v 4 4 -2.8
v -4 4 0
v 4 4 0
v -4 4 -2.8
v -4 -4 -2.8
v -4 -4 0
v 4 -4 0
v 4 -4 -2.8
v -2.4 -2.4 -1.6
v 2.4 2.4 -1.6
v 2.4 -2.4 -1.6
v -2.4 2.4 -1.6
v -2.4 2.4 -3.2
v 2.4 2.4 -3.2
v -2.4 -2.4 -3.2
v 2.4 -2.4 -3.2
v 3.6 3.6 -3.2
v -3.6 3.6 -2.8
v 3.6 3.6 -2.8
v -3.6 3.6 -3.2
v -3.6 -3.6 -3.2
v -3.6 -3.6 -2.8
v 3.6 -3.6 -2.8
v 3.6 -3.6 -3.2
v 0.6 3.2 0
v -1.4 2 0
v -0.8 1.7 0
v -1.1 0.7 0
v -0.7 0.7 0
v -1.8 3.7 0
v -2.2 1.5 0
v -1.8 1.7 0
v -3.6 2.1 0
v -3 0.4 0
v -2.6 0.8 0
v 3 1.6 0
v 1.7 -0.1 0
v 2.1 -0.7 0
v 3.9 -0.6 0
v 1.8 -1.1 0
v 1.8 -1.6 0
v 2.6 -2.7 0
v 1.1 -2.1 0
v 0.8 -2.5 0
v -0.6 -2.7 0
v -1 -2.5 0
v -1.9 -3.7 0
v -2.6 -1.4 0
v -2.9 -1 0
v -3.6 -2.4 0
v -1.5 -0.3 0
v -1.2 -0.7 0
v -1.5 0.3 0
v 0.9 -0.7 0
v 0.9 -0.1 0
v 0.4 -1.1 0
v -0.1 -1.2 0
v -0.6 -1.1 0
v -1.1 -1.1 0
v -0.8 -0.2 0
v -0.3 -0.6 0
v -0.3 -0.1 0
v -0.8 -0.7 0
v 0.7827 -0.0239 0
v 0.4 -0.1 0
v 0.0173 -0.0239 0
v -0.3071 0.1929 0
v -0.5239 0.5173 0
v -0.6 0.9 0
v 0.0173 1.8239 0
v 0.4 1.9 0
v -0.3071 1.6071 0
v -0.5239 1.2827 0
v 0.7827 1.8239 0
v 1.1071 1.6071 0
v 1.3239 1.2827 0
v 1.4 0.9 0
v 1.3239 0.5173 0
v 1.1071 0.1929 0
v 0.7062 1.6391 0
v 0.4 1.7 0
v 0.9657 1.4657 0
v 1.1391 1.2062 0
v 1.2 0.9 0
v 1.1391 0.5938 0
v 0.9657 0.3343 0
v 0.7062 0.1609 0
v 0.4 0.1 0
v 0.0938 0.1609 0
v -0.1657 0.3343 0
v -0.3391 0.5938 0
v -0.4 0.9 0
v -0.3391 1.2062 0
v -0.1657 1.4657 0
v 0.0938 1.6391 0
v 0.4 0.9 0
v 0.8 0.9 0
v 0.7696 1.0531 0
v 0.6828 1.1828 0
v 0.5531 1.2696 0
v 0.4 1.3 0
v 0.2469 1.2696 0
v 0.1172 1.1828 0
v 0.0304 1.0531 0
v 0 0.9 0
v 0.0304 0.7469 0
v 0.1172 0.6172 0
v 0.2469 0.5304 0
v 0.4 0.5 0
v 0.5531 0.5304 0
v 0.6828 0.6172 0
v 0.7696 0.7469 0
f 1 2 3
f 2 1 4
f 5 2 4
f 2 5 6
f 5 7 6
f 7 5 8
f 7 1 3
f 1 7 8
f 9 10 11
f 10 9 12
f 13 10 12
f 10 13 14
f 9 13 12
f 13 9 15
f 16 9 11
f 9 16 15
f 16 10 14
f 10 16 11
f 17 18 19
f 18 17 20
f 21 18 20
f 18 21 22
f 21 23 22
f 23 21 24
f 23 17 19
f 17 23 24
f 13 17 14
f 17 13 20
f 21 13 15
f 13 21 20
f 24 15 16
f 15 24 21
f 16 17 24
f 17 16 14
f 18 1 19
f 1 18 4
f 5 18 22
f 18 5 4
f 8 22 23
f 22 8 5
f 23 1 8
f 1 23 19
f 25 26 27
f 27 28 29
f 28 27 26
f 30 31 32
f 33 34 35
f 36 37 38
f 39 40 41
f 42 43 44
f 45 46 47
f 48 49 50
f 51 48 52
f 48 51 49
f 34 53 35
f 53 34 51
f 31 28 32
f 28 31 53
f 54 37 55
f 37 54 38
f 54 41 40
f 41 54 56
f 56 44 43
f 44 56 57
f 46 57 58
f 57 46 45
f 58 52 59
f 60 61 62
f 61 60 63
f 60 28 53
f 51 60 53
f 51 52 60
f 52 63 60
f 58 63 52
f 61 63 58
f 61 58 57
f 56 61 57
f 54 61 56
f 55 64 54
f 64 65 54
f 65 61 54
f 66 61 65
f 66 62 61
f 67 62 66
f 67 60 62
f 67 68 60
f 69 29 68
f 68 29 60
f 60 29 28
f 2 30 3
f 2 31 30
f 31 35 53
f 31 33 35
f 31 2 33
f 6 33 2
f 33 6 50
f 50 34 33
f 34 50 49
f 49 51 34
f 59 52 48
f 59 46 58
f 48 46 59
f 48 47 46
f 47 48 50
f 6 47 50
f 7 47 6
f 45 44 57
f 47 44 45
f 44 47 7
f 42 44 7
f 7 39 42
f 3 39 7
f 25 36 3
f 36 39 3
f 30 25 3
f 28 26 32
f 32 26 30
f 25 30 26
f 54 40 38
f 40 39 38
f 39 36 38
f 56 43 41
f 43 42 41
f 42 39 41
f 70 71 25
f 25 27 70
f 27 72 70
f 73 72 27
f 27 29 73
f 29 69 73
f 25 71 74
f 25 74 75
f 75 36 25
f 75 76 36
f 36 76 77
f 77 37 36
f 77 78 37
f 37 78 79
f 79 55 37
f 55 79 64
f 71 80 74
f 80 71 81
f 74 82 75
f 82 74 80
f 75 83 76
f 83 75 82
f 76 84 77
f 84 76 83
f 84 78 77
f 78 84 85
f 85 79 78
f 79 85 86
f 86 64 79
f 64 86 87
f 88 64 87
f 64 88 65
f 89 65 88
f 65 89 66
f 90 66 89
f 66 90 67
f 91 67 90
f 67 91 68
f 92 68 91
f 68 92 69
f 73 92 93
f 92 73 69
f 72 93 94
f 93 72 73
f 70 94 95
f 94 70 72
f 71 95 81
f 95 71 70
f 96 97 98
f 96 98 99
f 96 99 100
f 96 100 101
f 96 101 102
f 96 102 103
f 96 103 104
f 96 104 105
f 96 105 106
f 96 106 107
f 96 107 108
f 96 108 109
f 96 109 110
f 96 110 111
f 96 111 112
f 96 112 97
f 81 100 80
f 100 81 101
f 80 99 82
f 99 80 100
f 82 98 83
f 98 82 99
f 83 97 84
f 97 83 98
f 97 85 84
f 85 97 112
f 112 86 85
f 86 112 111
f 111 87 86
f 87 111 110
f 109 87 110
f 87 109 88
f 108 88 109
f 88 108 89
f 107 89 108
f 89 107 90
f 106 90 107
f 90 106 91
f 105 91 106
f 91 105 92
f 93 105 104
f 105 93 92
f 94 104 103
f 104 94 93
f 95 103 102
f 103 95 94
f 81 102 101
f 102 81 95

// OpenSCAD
// file: ../p/box5.scad
use <../lib.scad>
function ldraw_lib__box5() = [
// 0 Box with 5 Faces and All Edges
// 0 Name: box5.dat
// 0 Author: James Jessiman
// 0 !LDRAW_ORG Primitive UPDATE 2012-01
// 0 !LICENSE Licensed under CC BY 2.0 and CC BY 4.0 : see CAreadme.txt
// 
// 0 BFC CERTIFY CCW
  [0,"BFC","CERTIFY"],
  [0,"BFC","CCW"],
// 
// 0 !HISTORY 2002-04-03 [sbliss] Modified for BFC compliance
// 0 !HISTORY 2002-04-25 [PTadmin] Official Update 2002-02
// 0 !HISTORY 2007-06-24 [PTadmin] Header formatted for Contributor Agreement
// 0 !HISTORY 2008-07-01 [PTadmin] Official Update 2008-01
// 0 !HISTORY 2012-02-16 [Philo] Changed to CCW
// 0 !HISTORY 2012-03-30 [PTadmin] Official Update 2012-01
// 
// 
// 2 24 1 1 1 -1 1 1
  [2,24,1,1,1,-1,1,1],
// 2 24 -1 1 1 -1 1 -1
  [2,24,-1,1,1,-1,1,-1],
// 2 24 -1 1 -1 1 1 -1
  [2,24,-1,1,-1,1,1,-1],
// 2 24 1 1 -1 1 1 1
  [2,24,1,1,-1,1,1,1],
// 2 24 1 0 1 -1 0 1
  [2,24,1,0,1,-1,0,1],
// 2 24 -1 0 1 -1 0 -1
  [2,24,-1,0,1,-1,0,-1],
// 2 24 -1 0 -1 1 0 -1
  [2,24,-1,0,-1,1,0,-1],
// 2 24 1 0 -1 1 0 1
  [2,24,1,0,-1,1,0,1],
// 2 24 1 0 1 1 1 1
  [2,24,1,0,1,1,1,1],
// 2 24 -1 0 1 -1 1 1
  [2,24,-1,0,1,-1,1,1],
// 2 24 1 0 -1 1 1 -1
  [2,24,1,0,-1,1,1,-1],
// 2 24 -1 0 -1 -1 1 -1
  [2,24,-1,0,-1,-1,1,-1],
// 4 16 -1 1 1 1 1 1 1 1 -1 -1 1 -1
  [4,16,-1,1,1,1,1,1,1,1,-1,-1,1,-1],
// 4 16 -1 1 1 -1 0 1 1 0 1 1 1 1
  [4,16,-1,1,1,-1,0,1,1,0,1,1,1,1],
// 4 16 -1 1 -1 -1 0 -1 -1 0 1 -1 1 1
  [4,16,-1,1,-1,-1,0,-1,-1,0,1,-1,1,1],
// 4 16 1 1 -1 1 0 -1 -1 0 -1 -1 1 -1
  [4,16,1,1,-1,1,0,-1,-1,0,-1,-1,1,-1],
// 4 16 1 1 1 1 0 1 1 0 -1 1 1 -1
  [4,16,1,1,1,1,0,1,1,0,-1,1,1,-1],
];
makepoly(ldraw_lib__box5(), line=0.2);
// file: ../p/box4.scad
use <../lib.scad>
function ldraw_lib__box4() = [
// 0 Box with 4 Faces (2 Parallel Pairs) and All Edges
// 0 Name: box4.dat
// 0 Author: James Jessiman
// 0 !LDRAW_ORG Primitive UPDATE 2012-01
// 0 !LICENSE Licensed under CC BY 2.0 and CC BY 4.0 : see CAreadme.txt
// 
// 0 BFC CERTIFY CCW
  [0,"BFC","CERTIFY"],
  [0,"BFC","CCW"],
// 
// 0 !HISTORY 2002-04-03 [sbliss] Modified for BFC compliance
// 0 !HISTORY 2002-04-25 [PTadmin] Official Update 2002-02
// 0 !HISTORY 2007-06-24 [PTadmin] Header formatted for Contributor Agreement
// 0 !HISTORY 2008-07-01 [PTadmin] Official Update 2008-01
// 0 !HISTORY 2012-02-16 [Philo] Changed to CCW
// 0 !HISTORY 2012-03-30 [PTadmin] Official Update 2012-01
// 
// 
// 2 24 1 1 1 -1 1 1
  [2,24,1,1,1,-1,1,1],
// 2 24 -1 1 1 -1 1 -1
  [2,24,-1,1,1,-1,1,-1],
// 2 24 -1 1 -1 1 1 -1
  [2,24,-1,1,-1,1,1,-1],
// 2 24 1 1 -1 1 1 1
  [2,24,1,1,-1,1,1,1],
// 2 24 1 0 1 -1 0 1
  [2,24,1,0,1,-1,0,1],
// 2 24 -1 0 1 -1 0 -1
  [2,24,-1,0,1,-1,0,-1],
// 2 24 -1 0 -1 1 0 -1
  [2,24,-1,0,-1,1,0,-1],
// 2 24 1 0 -1 1 0 1
  [2,24,1,0,-1,1,0,1],
// 2 24 1 0 1 1 1 1
  [2,24,1,0,1,1,1,1],
// 2 24 -1 0 1 -1 1 1
  [2,24,-1,0,1,-1,1,1],
// 2 24 1 0 -1 1 1 -1
  [2,24,1,0,-1,1,1,-1],
// 2 24 -1 0 -1 -1 1 -1
  [2,24,-1,0,-1,-1,1,-1],
// 4 16 -1 1 1 -1 0 1 1 0 1 1 1 1
  [4,16,-1,1,1,-1,0,1,1,0,1,1,1,1],
// 4 16 -1 1 -1 -1 0 -1 -1 0 1 -1 1 1
  [4,16,-1,1,-1,-1,0,-1,-1,0,1,-1,1,1],
// 4 16 1 1 -1 1 0 -1 -1 0 -1 -1 1 -1
  [4,16,1,1,-1,1,0,-1,-1,0,-1,-1,1,-1],
// 4 16 1 1 1 1 0 1 1 0 -1 1 1 -1
  [4,16,1,1,1,1,0,1,1,0,-1,1,1,-1],
];
makepoly(ldraw_lib__box4(), line=0.2);
// file: s/3070bs01.scad
use <../../lib.scad>
use <../../p/box4.scad>
use <../../p/box5.scad>
function ldraw_lib__s__3070bs01() = [
// 0 ~Tile  1 x  1 with Groove without Top Face
// 0 Name: s\3070bs01.dat
// 0 Author: Chris Dee [cwdee]
// 0 !LDRAW_ORG Subpart UPDATE 2009-02
// 0 !LICENSE Licensed under CC BY 2.0 and CC BY 4.0 : see CAreadme.txt
// 
// 0 BFC CERTIFY CCW
  [0,"BFC","CERTIFY"],
  [0,"BFC","CCW"],
// 
// 0 !HISTORY 2009-09-03 [PTadmin] Official Update 2009-02
// 
// 
// 1 16 0 0 0 10 0 0 0 7 0 0 0 10 box4.dat
  [1,16,0,0,0,10,0,0,0,7,0,0,0,10, ldraw_lib__box4()],
// 0 BFC INVERTNEXT
  [0,"BFC","INVERTNEXT"],
// 1 16 0 8 0 6 0 0 0 -4 0 0 0 6 box5.dat
  [1,16,0,8,0,6,0,0,0,-4,0,0,0,6, ldraw_lib__box5()],
// 1 16 0 7 0 9 0 0 0 1 0 0 0 9 box4.dat
  [1,16,0,7,0,9,0,0,0,1,0,0,0,9, ldraw_lib__box4()],
// 
// 4 16 9 8 9 6 8 6 -6 8 6 -9 8 9
  [4,16,9,8,9,6,8,6,-6,8,6,-9,8,9],
// 4 16 -9 8 9 -6 8 6 -6 8 -6 -9 8 -9
  [4,16,-9,8,9,-6,8,6,-6,8,-6,-9,8,-9],
// 4 16 -9 8 -9 -6 8 -6 6 8 -6 9 8 -9
  [4,16,-9,8,-9,-6,8,-6,6,8,-6,9,8,-9],
// 4 16 9 8 -9 6 8 -6 6 8 6 9 8 9
  [4,16,9,8,-9,6,8,-6,6,8,6,9,8,9],
// 
// 4 16 10 7 10 9 7 9 -9 7 9 -10 7 10
  [4,16,10,7,10,9,7,9,-9,7,9,-10,7,10],
// 4 16 -10 7 10 -9 7 9 -9 7 -9 -10 7 -10
  [4,16,-10,7,10,-9,7,9,-9,7,-9,-10,7,-10],
// 4 16 -10 7 -10 -9 7 -9 9 7 -9 10 7 -10
  [4,16,-10,7,-10,-9,7,-9,9,7,-9,10,7,-10],
// 4 16 10 7 -10 9 7 -9 9 7 9 10 7 10
  [4,16,10,7,-10,9,7,-9,9,7,9,10,7,10],
// 0
];
makepoly(ldraw_lib__s__3070bs01(), line=0.2);
// file: ../p/4-4disc.scad
use <../lib.scad>
function ldraw_lib__4_4disc() = [
// 0 Disc 1.0
// 0 Name: 4-4disc.dat
// 0 Author: James Jessiman
// 0 !LDRAW_ORG Primitive UPDATE 2002-02
// 0 !LICENSE Licensed under CC BY 2.0 and CC BY 4.0 : see CAreadme.txt
// 
// 0 BFC CERTIFY CCW
  [0,"BFC","CERTIFY"],
  [0,"BFC","CCW"],
// 
// 0 !HISTORY 1998-12-15 [PTadmin] Official Update 1998-10
// 0 !HISTORY 2002-03-23 [sbliss] Added BFC statement
// 0 !HISTORY 2002-04-25 [PTadmin] Official Update 2002-02
// 0 !HISTORY 2007-06-24 [PTadmin] Header formatted for Contributor Agreement
// 0 !HISTORY 2008-07-01 [PTadmin] Official Update 2008-01
// 
// 
// 3 16 0 0 0 1 0 0 0.9239 0 0.3827
  [3,16,0,0,0,1,0,0,0.9239,0,0.3827],
// 3 16 0 0 0 0.9239 0 0.3827 0.7071 0 0.7071
  [3,16,0,0,0,0.9239,0,0.3827,0.7071,0,0.7071],
// 3 16 0 0 0 0.7071 0 0.7071 0.3827 0 0.9239
  [3,16,0,0,0,0.7071,0,0.7071,0.3827,0,0.9239],
// 3 16 0 0 0 0.3827 0 0.9239 0 0 1
  [3,16,0,0,0,0.3827,0,0.9239,0,0,1],
// 3 16 0 0 0 0 0 1 -0.3827 0 0.9239
  [3,16,0,0,0,0,0,1,-0.3827,0,0.9239],
// 3 16 0 0 0 -0.3827 0 0.9239 -0.7071 0 0.7071
  [3,16,0,0,0,-0.3827,0,0.9239,-0.7071,0,0.7071],
// 3 16 0 0 0 -0.7071 0 0.7071 -0.9239 0 0.3827
  [3,16,0,0,0,-0.7071,0,0.7071,-0.9239,0,0.3827],
// 3 16 0 0 0 -0.9239 0 0.3827 -1 0 -0
  [3,16,0,0,0,-0.9239,0,0.3827,-1,0,-0],
// 3 16 0 0 0 -1 0 -0 -0.9239 0 -0.3827
  [3,16,0,0,0,-1,0,-0,-0.9239,0,-0.3827],
// 3 16 0 0 0 -0.9239 0 -0.3827 -0.7071 0 -0.7071
  [3,16,0,0,0,-0.9239,0,-0.3827,-0.7071,0,-0.7071],
// 3 16 0 0 0 -0.7071 0 -0.7071 -0.3827 0 -0.9239
  [3,16,0,0,0,-0.7071,0,-0.7071,-0.3827,0,-0.9239],
// 3 16 0 0 0 -0.3827 0 -0.9239 0 0 -1
  [3,16,0,0,0,-0.3827,0,-0.9239,0,0,-1],
// 3 16 0 0 0 0 0 -1 0.3827 0 -0.9239
  [3,16,0,0,0,0,0,-1,0.3827,0,-0.9239],
// 3 16 0 0 0 0.3827 0 -0.9239 0.7071 0 -0.7071
  [3,16,0,0,0,0.3827,0,-0.9239,0.7071,0,-0.7071],
// 3 16 0 0 0 0.7071 0 -0.7071 0.9239 0 -0.3827
  [3,16,0,0,0,0.7071,0,-0.7071,0.9239,0,-0.3827],
// 3 16 0 0 0 0.9239 0 -0.3827 1 0 0
  [3,16,0,0,0,0.9239,0,-0.3827,1,0,0],
// 0
];
makepoly(ldraw_lib__4_4disc(), line=0.2);
// main file
use <../lib.scad>
use <../p/4-4disc.scad>
use <s/3070bs01.scad>
function ldraw_lib__3070bph0() = [
// 0 Tile  1 x  1 with Spider Pattern
// 0 Name: 3070bph0.dat
// 0 Author: Michael Heidemann [mikeheide]
// 0 !LDRAW_ORG Part UPDATE 2009-03
// 0 !LICENSE Licensed under CC BY 2.0 and CC BY 4.0 : see CAreadme.txt
// 
// 0 BFC CERTIFY CCW
  [0,"BFC","CERTIFY"],
  [0,"BFC","CCW"],
// 
// 0 !HISTORY 2009-12-29 [PTadmin] Official Update 2009-03
// 
// 
// 1 16 0 0 0 1 0 0 0 1 0 0 0 1 s\3070bs01.dat
  [1,16,0,0,0,1,0,0,0,1,0,0,0,1, ldraw_lib__s__3070bs01()],
// 3 0 1.5 0 8 -3.5 0 5 -2 0 4.25
  [3,0,1.5,0,8,-3.5,0,5,-2,0,4.25],
// 4 0 -3.5 0 5 -2.75 0 1.75 -1.75 0 1.75 -2 0 4.25
  [4,0,-3.5,0,5,-2.75,0,1.75,-1.75,0,1.75,-2,0,4.25],
// 3 0 -4.5 0 9.25 -5.5 0 3.75 -4.5 0 4.25
  [3,0,-4.5,0,9.25,-5.5,0,3.75,-4.5,0,4.25],
// 3 0 -9 0 5.25 -7.5 0 1 -6.5 0 2
  [3,0,-9,0,5.25,-7.5,0,1,-6.5,0,2],
// 3 0 7.5 0 4 4.25 0 -0.25 5.25 0 -1.75
  [3,0,7.5,0,4,4.25,0,-0.25,5.25,0,-1.75],
// 3 0 9.75 0 -1.5 4.5 0 -2.75 4.5 0 -4
  [3,0,9.75,0,-1.5,4.5,0,-2.75,4.5,0,-4],
// 3 0 6.5 0 -6.75 2.75 0 -5.25 2 0 -6.25
  [3,0,6.5,0,-6.75,2.75,0,-5.25,2,0,-6.25],
// 3 0 -1.5 0 -6.75 -2.5 0 -6.25 -4.75 0 -9.25
  [3,0,-1.5,0,-6.75,-2.5,0,-6.25,-4.75,0,-9.25],
// 3 0 -6.5 0 -3.5 -7.25 0 -2.5 -9 0 -6
  [3,0,-6.5,0,-3.5,-7.25,0,-2.5,-9,0,-6],
// 4 0 -6.5 0 -3.5 -3 0 -1.75 -3.75 0 -0.75 -7.25 0 -2.5
  [4,0,-6.5,0,-3.5,-3,0,-1.75,-3.75,0,-0.75,-7.25,0,-2.5],
// 4 0 -6.5 0 2 -7.5 0 1 -3.75 0 -0.75 -3.75 0 0.75
  [4,0,-6.5,0,2,-7.5,0,1,-3.75,0,-0.75,-3.75,0,0.75],
// 4 0 -4.5 0 4.25 -5.5 0 3.75 -3.75 0 0.75 -2.75 0 1.75
  [4,0,-4.5,0,4.25,-5.5,0,3.75,-3.75,0,0.75,-2.75,0,1.75],
// 4 0 4.25 0 -0.25 2.25 0 -0.25 2.25 0 -1.75 5.25 0 -1.75
  [4,0,4.25,0,-0.25,2.25,0,-0.25,2.25,0,-1.75,5.25,0,-1.75],
// 4 0 4.5 0 -2.75 2.25 0 -1.75 1 0 -2.75 4.5 0 -4
  [4,0,4.5,0,-2.75,2.25,0,-1.75,1,0,-2.75,4.5,0,-4],
// 4 0 2 0 -6.25 2.75 0 -5.25 1 0 -2.75 -0.25 0 -3
  [4,0,2,0,-6.25,2.75,0,-5.25,1,0,-2.75,-0.25,0,-3],
// 4 0 -2.5 0 -6.25 -1.5 0 -6.75 -0.25 0 -3 -1.5 0 -2.75
  [4,0,-2.5,0,-6.25,-1.5,0,-6.75,-0.25,0,-3,-1.5,0,-2.75],
// 3 0 -1.5 0 -2.75 -3 0 -1.75 -2.75 0 -2.75
  [3,0,-1.5,0,-2.75,-3,0,-1.75,-2.75,0,-2.75],
// 4 15 -2 0 -1.75 -0.75 0 -1.5 -0.75 0 -0.25 -2 0 -0.5
  [4,15,-2,0,-1.75,-0.75,0,-1.5,-0.75,0,-0.25,-2,0,-0.5],
// 3 0 -2 0 -0.5 -2.75 0 1.75 -3.75 0 0.75
  [3,0,-2,0,-0.5,-2.75,0,1.75,-3.75,0,0.75],
// 3 0 -3.75 0 -0.75 -2 0 -0.5 -3.75 0 0.75
  [3,0,-3.75,0,-0.75,-2,0,-0.5,-3.75,0,0.75],
// 3 0 -3.75 0 -0.75 -3 0 -1.75 -2 0 -0.5
  [3,0,-3.75,0,-0.75,-3,0,-1.75,-2,0,-0.5],
// 3 0 -3 0 -1.75 -2 0 -1.75 -2 0 -0.5
  [3,0,-3,0,-1.75,-2,0,-1.75,-2,0,-0.5],
// 3 0 -1.5 0 -2.75 -2 0 -1.75 -3 0 -1.75
  [3,0,-1.5,0,-2.75,-2,0,-1.75,-3,0,-1.75],
// 3 0 -0.75 0 -1.5 -2 0 -1.75 -1.5 0 -2.75
  [3,0,-0.75,0,-1.5,-2,0,-1.75,-1.5,0,-2.75],
// 3 0 -0.75 0 -1.5 -1.5 0 -2.75 -0.25 0 -3
  [3,0,-0.75,0,-1.5,-1.5,0,-2.75,-0.25,0,-3],
// 3 0 1 0 -2.75 -0.75 0 -1.5 -0.25 0 -3
  [3,0,1,0,-2.75,-0.75,0,-1.5,-0.25,0,-3],
// 3 0 2.25 0 -1.75 -0.75 0 -1.5 1 0 -2.75
  [3,0,2.25,0,-1.75,-0.75,0,-1.5,1,0,-2.75],
// 3 0 2.25 0 -0.25 1.9567 0 -0.0597 2.25 0 -1.75
  [3,0,2.25,0,-0.25,1.9567,0,-0.0597,2.25,0,-1.75],
// 3 0 1.9567 0 -0.0597 1 0 -0.25 2.25 0 -1.75
  [3,0,1.9567,0,-0.0597,1,0,-0.25,2.25,0,-1.75],
// 3 0 1 0 -0.25 -0.75 0 -1.5 2.25 0 -1.75
  [3,0,1,0,-0.25,-0.75,0,-1.5,2.25,0,-1.75],
// 3 0 0.0433 0 -0.0597 -0.75 0 -1.5 1 0 -0.25
  [3,0,0.0433,0,-0.0597,-0.75,0,-1.5,1,0,-0.25],
// 3 0 0.0433 0 -0.0597 -0.75 0 -0.25 -0.75 0 -1.5
  [3,0,0.0433,0,-0.0597,-0.75,0,-0.25,-0.75,0,-1.5],
// 3 0 -0.7678 0 0.4822 -0.75 0 -0.25 0.0433 0 -0.0597
  [3,0,-0.7678,0,0.4822,-0.75,0,-0.25,0.0433,0,-0.0597],
// 3 0 -0.7678 0 0.4822 -2 0 -0.5 -0.75 0 -0.25
  [3,0,-0.7678,0,0.4822,-2,0,-0.5,-0.75,0,-0.25],
// 3 0 -0.7678 0 0.4822 -1.3097 0 1.2933 -2 0 -0.5
  [3,0,-0.7678,0,0.4822,-1.3097,0,1.2933,-2,0,-0.5],
// 3 0 -1.5 0 2.25 -1.75 0 1.75 -1.3097 0 1.2933
  [3,0,-1.5,0,2.25,-1.75,0,1.75,-1.3097,0,1.2933],
// 3 0 -1.3097 0 1.2933 -1.75 0 1.75 -2 0 -0.5
  [3,0,-1.3097,0,1.2933,-1.75,0,1.75,-2,0,-0.5],
// 3 0 -2 0 -0.5 -1.75 0 1.75 -2.75 0 1.75
  [3,0,-2,0,-0.5,-1.75,0,1.75,-2.75,0,1.75],
// 3 16 -10 0 10 -4.5 0 9.25 10 0 10
  [3,16,-10,0,10,-4.5,0,9.25,10,0,10],
// 3 16 -10 0 10 -5.5 0 3.75 -4.5 0 9.25
  [3,16,-10,0,10,-5.5,0,3.75,-4.5,0,9.25],
// 3 16 -5.5 0 3.75 -6.5 0 2 -3.75 0 0.75
  [3,16,-5.5,0,3.75,-6.5,0,2,-3.75,0,0.75],
// 3 16 -5.5 0 3.75 -9 0 5.25 -6.5 0 2
  [3,16,-5.5,0,3.75,-9,0,5.25,-6.5,0,2],
// 3 16 -5.5 0 3.75 -10 0 10 -9 0 5.25
  [3,16,-5.5,0,3.75,-10,0,10,-9,0,5.25],
// 4 16 -9 0 -6 -9 0 5.25 -10 0 10 -10 0 -10
  [4,16,-9,0,-6,-9,0,5.25,-10,0,10,-10,0,-10],
// 4 16 -7.25 0 -2.5 -7.5 0 1 -9 0 5.25 -9 0 -6
  [4,16,-7.25,0,-2.5,-7.5,0,1,-9,0,5.25,-9,0,-6],
// 3 16 -7.25 0 -2.5 -3.75 0 -0.75 -7.5 0 1
  [3,16,-7.25,0,-2.5,-3.75,0,-0.75,-7.5,0,1],
// 3 16 -2.75 0 -2.75 -3 0 -1.75 -6.5 0 -3.5
  [3,16,-2.75,0,-2.75,-3,0,-1.75,-6.5,0,-3.5],
// 3 16 -2.75 0 -2.75 -2.5 0 -6.25 -1.5 0 -2.75
  [3,16,-2.75,0,-2.75,-2.5,0,-6.25,-1.5,0,-2.75],
// 3 16 -6.5 0 -3.5 -2.5 0 -6.25 -2.75 0 -2.75
  [3,16,-6.5,0,-3.5,-2.5,0,-6.25,-2.75,0,-2.75],
// 4 16 -6.5 0 -3.5 -9 0 -6 -4.75 0 -9.25 -2.5 0 -6.25
  [4,16,-6.5,0,-3.5,-9,0,-6,-4.75,0,-9.25,-2.5,0,-6.25],
// 3 16 -10 0 -10 -4.75 0 -9.25 -9 0 -6
  [3,16,-10,0,-10,-4.75,0,-9.25,-9,0,-6],
// 3 16 10 0 -10 -4.75 0 -9.25 -10 0 -10
  [3,16,10,0,-10,-4.75,0,-9.25,-10,0,-10],
// 3 16 -1.5 0 -6.75 2 0 -6.25 -0.25 0 -3
  [3,16,-1.5,0,-6.75,2,0,-6.25,-0.25,0,-3],
// 4 16 -4.75 0 -9.25 10 0 -10 2 0 -6.25 -1.5 0 -6.75
  [4,16,-4.75,0,-9.25,10,0,-10,2,0,-6.25,-1.5,0,-6.75],
// 3 16 6.5 0 -6.75 2 0 -6.25 10 0 -10
  [3,16,6.5,0,-6.75,2,0,-6.25,10,0,-10],
// 3 16 10 0 -10 9.75 0 -1.5 6.5 0 -6.75
  [3,16,10,0,-10,9.75,0,-1.5,6.5,0,-6.75],
// 3 16 10 0 10 9.75 0 -1.5 10 0 -10
  [3,16,10,0,10,9.75,0,-1.5,10,0,-10],
// 3 16 1.5 0 8 7.5 0 4 10 0 10
  [3,16,1.5,0,8,7.5,0,4,10,0,10],
// 3 16 7.5 0 4 9.75 0 -1.5 10 0 10
  [3,16,7.5,0,4,9.75,0,-1.5,10,0,10],
// 3 16 -4.5 0 9.25 1.5 0 8 10 0 10
  [3,16,-4.5,0,9.25,1.5,0,8,10,0,10],
// 3 16 -2.75 0 1.75 -3.5 0 5 -4.5 0 4.25
  [3,16,-2.75,0,1.75,-3.5,0,5,-4.5,0,4.25],
// 3 16 -4.5 0 4.25 -3.5 0 5 -4.5 0 9.25
  [3,16,-4.5,0,4.25,-3.5,0,5,-4.5,0,9.25],
// 3 16 1.5 0 8 -4.5 0 9.25 -3.5 0 5
  [3,16,1.5,0,8,-4.5,0,9.25,-3.5,0,5],
// 3 16 2.25 0 -1.75 4.5 0 -2.75 5.25 0 -1.75
  [3,16,2.25,0,-1.75,4.5,0,-2.75,5.25,0,-1.75],
// 3 16 4.5 0 -2.75 9.75 0 -1.5 5.25 0 -1.75
  [3,16,4.5,0,-2.75,9.75,0,-1.5,5.25,0,-1.75],
// 3 16 9.75 0 -1.5 7.5 0 4 5.25 0 -1.75
  [3,16,9.75,0,-1.5,7.5,0,4,5.25,0,-1.75],
// 3 16 1 0 -2.75 2.75 0 -5.25 4.5 0 -4
  [3,16,1,0,-2.75,2.75,0,-5.25,4.5,0,-4],
// 3 16 2.75 0 -5.25 6.5 0 -6.75 4.5 0 -4
  [3,16,2.75,0,-5.25,6.5,0,-6.75,4.5,0,-4],
// 3 16 6.5 0 -6.75 9.75 0 -1.5 4.5 0 -4
  [3,16,6.5,0,-6.75,9.75,0,-1.5,4.5,0,-4],
// 3 16 0.0433 0 4.5597 1 0 4.75 1.5 0 8
  [3,16,0.0433,0,4.5597,1,0,4.75,1.5,0,8],
// 3 16 1.5 0 8 -2 0 4.25 0.0433 0 4.5597
  [3,16,1.5,0,8,-2,0,4.25,0.0433,0,4.5597],
// 3 16 -2 0 4.25 -0.7678 0 4.0178 0.0433 0 4.5597
  [3,16,-2,0,4.25,-0.7678,0,4.0178,0.0433,0,4.5597],
// 3 16 -1.3097 0 3.2067 -0.7678 0 4.0178 -2 0 4.25
  [3,16,-1.3097,0,3.2067,-0.7678,0,4.0178,-2,0,4.25],
// 3 16 -2 0 4.25 -1.75 0 1.75 -1.3097 0 3.2067
  [3,16,-2,0,4.25,-1.75,0,1.75,-1.3097,0,3.2067],
// 3 16 -1.75 0 1.75 -1.5 0 2.25 -1.3097 0 3.2067
  [3,16,-1.75,0,1.75,-1.5,0,2.25,-1.3097,0,3.2067],
// 3 16 1.5 0 8 1 0 4.75 1.9567 0 4.5597
  [3,16,1.5,0,8,1,0,4.75,1.9567,0,4.5597],
// 3 16 1.5 0 8 1.9567 0 4.5597 2.7678 0 4.0178
  [3,16,1.5,0,8,1.9567,0,4.5597,2.7678,0,4.0178],
// 3 16 2.7678 0 4.0178 7.5 0 4 1.5 0 8
  [3,16,2.7678,0,4.0178,7.5,0,4,1.5,0,8],
// 3 16 2.7678 0 4.0178 3.3097 0 3.2067 7.5 0 4
  [3,16,2.7678,0,4.0178,3.3097,0,3.2067,7.5,0,4],
// 3 16 7.5 0 4 3.3097 0 3.2067 3.5 0 2.25
  [3,16,7.5,0,4,3.3097,0,3.2067,3.5,0,2.25],
// 3 16 3.5 0 2.25 4.25 0 -0.25 7.5 0 4
  [3,16,3.5,0,2.25,4.25,0,-0.25,7.5,0,4],
// 3 16 3.5 0 2.25 3.3097 0 1.2933 4.25 0 -0.25
  [3,16,3.5,0,2.25,3.3097,0,1.2933,4.25,0,-0.25],
// 3 16 4.25 0 -0.25 3.3097 0 1.2933 2.7678 0 0.4822
  [3,16,4.25,0,-0.25,3.3097,0,1.2933,2.7678,0,0.4822],
// 4 16 2.7678 0 0.4822 1.9567 0 -0.0597 2.25 0 -0.25 4.25 0 -0.25
  [4,16,2.7678,0,0.4822,1.9567,0,-0.0597,2.25,0,-0.25,4.25,0,-0.25],
// 4 0 1 0 4.75 1 0 4.25 1.7654 0 4.0978 1.9567 0 4.5597
  [4,0,1,0,4.75,1,0,4.25,1.7654,0,4.0978,1.9567,0,4.5597],
// 4 0 2.4142 0 3.6642 2.7678 0 4.0178 1.9567 0 4.5597 1.7654 0 4.0978
  [4,0,2.4142,0,3.6642,2.7678,0,4.0178,1.9567,0,4.5597,1.7654,0,4.0978],
// 4 0 3.3097 0 3.2067 2.7678 0 4.0178 2.4142 0 3.6642 2.8478 0 3.0154
  [4,0,3.3097,0,3.2067,2.7678,0,4.0178,2.4142,0,3.6642,2.8478,0,3.0154],
// 4 0 3.5 0 2.25 3.3097 0 3.2067 2.8478 0 3.0154 3 0 2.25
  [4,0,3.5,0,2.25,3.3097,0,3.2067,2.8478,0,3.0154,3,0,2.25],
// 4 0 3 0 2.25 2.8478 0 1.4846 3.3097 0 1.2933 3.5 0 2.25
  [4,0,3,0,2.25,2.8478,0,1.4846,3.3097,0,1.2933,3.5,0,2.25],
// 4 0 2.4142 0 0.8358 2.7678 0 0.4822 3.3097 0 1.2933 2.8478 0 1.4846
  [4,0,2.4142,0,0.8358,2.7678,0,0.4822,3.3097,0,1.2933,2.8478,0,1.4846],
// 4 0 2.4142 0 0.8358 1.7654 0 0.4022 1.9567 0 -0.0597 2.7678 0 0.4822
  [4,0,2.4142,0,0.8358,1.7654,0,0.4022,1.9567,0,-0.0597,2.7678,0,0.4822],
// 4 0 1.7654 0 0.4022 1 0 0.25 1 0 -0.25 1.9567 0 -0.0597
  [4,0,1.7654,0,0.4022,1,0,0.25,1,0,-0.25,1.9567,0,-0.0597],
// 4 0 1 0 0.25 0.2346 0 0.4022 0.0433 0 -0.0597 1 0 -0.25
  [4,0,1,0,0.25,0.2346,0,0.4022,0.0433,0,-0.0597,1,0,-0.25],
// 4 0 0.2346 0 0.4022 -0.4142 0 0.8358 -0.7678 0 0.4822 0.0433 0 -0.0597
  [4,0,0.2346,0,0.4022,-0.4142,0,0.8358,-0.7678,0,0.4822,0.0433,0,-0.0597],
// 4 0 -0.4142 0 0.8358 -0.8478 0 1.4846 -1.3097 0 1.2933 -0.7678 0 0.4822
  [4,0,-0.4142,0,0.8358,-0.8478,0,1.4846,-1.3097,0,1.2933,-0.7678,0,0.4822],
// 4 0 -1.3097 0 1.2933 -0.8478 0 1.4846 -1 0 2.25 -1.5 0 2.25
  [4,0,-1.3097,0,1.2933,-0.8478,0,1.4846,-1,0,2.25,-1.5,0,2.25],
// 4 0 -0.8478 0 3.0154 -1.3097 0 3.2067 -1.5 0 2.25 -1 0 2.25
  [4,0,-0.8478,0,3.0154,-1.3097,0,3.2067,-1.5,0,2.25,-1,0,2.25],
// 4 0 -0.8478 0 3.0154 -0.4142 0 3.6642 -0.7678 0 4.0178 -1.3097 0 3.2067
  [4,0,-0.8478,0,3.0154,-0.4142,0,3.6642,-0.7678,0,4.0178,-1.3097,0,3.2067],
// 4 0 0.2346 0 4.0978 0.0433 0 4.5597 -0.7678 0 4.0178 -0.4142 0 3.6642
  [4,0,0.2346,0,4.0978,0.0433,0,4.5597,-0.7678,0,4.0178,-0.4142,0,3.6642],
// 4 0 0.2346 0 4.0978 1 0 4.25 1 0 4.75 0.0433 0 4.5597
  [4,0,0.2346,0,4.0978,1,0,4.25,1,0,4.75,0.0433,0,4.5597],
// 1 8 1 0 2.25 1 0 0 0 1 0 0 0 1 4-4disc.dat
  [1,8,1,0,2.25,1,0,0,0,1,0,0,0,1, ldraw_lib__4_4disc()],
// 4 7 1 0 4.25 1 0 3.25 1.3827 0 3.1739 1.7654 0 4.0978
  [4,7,1,0,4.25,1,0,3.25,1.3827,0,3.1739,1.7654,0,4.0978],
// 4 7 1.7654 0 4.0978 1.3827 0 3.1739 1.7071 0 2.9571 2.4142 0 3.6642
  [4,7,1.7654,0,4.0978,1.3827,0,3.1739,1.7071,0,2.9571,2.4142,0,3.6642],
// 4 7 1.9239 0 2.6327 2.8478 0 3.0154 2.4142 0 3.6642 1.7071 0 2.9571
  [4,7,1.9239,0,2.6327,2.8478,0,3.0154,2.4142,0,3.6642,1.7071,0,2.9571],
// 4 7 3 0 2.25 2.8478 0 3.0154 1.9239 0 2.6327 2 0 2.25
  [4,7,3,0,2.25,2.8478,0,3.0154,1.9239,0,2.6327,2,0,2.25],
// 4 7 2 0 2.25 1.9239 0 1.8673 2.8478 0 1.4846 3 0 2.25
  [4,7,2,0,2.25,1.9239,0,1.8673,2.8478,0,1.4846,3,0,2.25],
// 4 7 1.7071 0 1.5429 2.4142 0 0.8358 2.8478 0 1.4846 1.9239 0 1.8673
  [4,7,1.7071,0,1.5429,2.4142,0,0.8358,2.8478,0,1.4846,1.9239,0,1.8673],
// 4 7 1.7071 0 1.5429 1.3827 0 1.3261 1.7654 0 0.4022 2.4142 0 0.8358
  [4,7,1.7071,0,1.5429,1.3827,0,1.3261,1.7654,0,0.4022,2.4142,0,0.8358],
// 4 7 1.3827 0 1.3261 1 0 1.25 1 0 0.25 1.7654 0 0.4022
  [4,7,1.3827,0,1.3261,1,0,1.25,1,0,0.25,1.7654,0,0.4022],
// 4 7 0.6173 0 1.3261 0.2346 0 0.4022 1 0 0.25 1 0 1.25
  [4,7,0.6173,0,1.3261,0.2346,0,0.4022,1,0,0.25,1,0,1.25],
// 4 7 0.6173 0 1.3261 0.2929 0 1.5429 -0.4142 0 0.8358 0.2346 0 0.4022
  [4,7,0.6173,0,1.3261,0.2929,0,1.5429,-0.4142,0,0.8358,0.2346,0,0.4022],
// 4 7 0.2929 0 1.5429 0.0761 0 1.8673 -0.8478 0 1.4846 -0.4142 0 0.8358
  [4,7,0.2929,0,1.5429,0.0761,0,1.8673,-0.8478,0,1.4846,-0.4142,0,0.8358],
// 4 7 0 0 2.25 -1 0 2.25 -0.8478 0 1.4846 0.0761 0 1.8673
  [4,7,0,0,2.25,-1,0,2.25,-0.8478,0,1.4846,0.0761,0,1.8673],
// 4 7 0.0761 0 2.6327 -0.8478 0 3.0154 -1 0 2.25 0 0 2.25
  [4,7,0.0761,0,2.6327,-0.8478,0,3.0154,-1,0,2.25,0,0,2.25],
// 4 7 0.2929 0 2.9571 -0.4142 0 3.6642 -0.8478 0 3.0154 0.0761 0 2.6327
  [4,7,0.2929,0,2.9571,-0.4142,0,3.6642,-0.8478,0,3.0154,0.0761,0,2.6327],
// 4 7 0.6173 0 3.1739 0.2346 0 4.0978 -0.4142 0 3.6642 0.2929 0 2.9571
  [4,7,0.6173,0,3.1739,0.2346,0,4.0978,-0.4142,0,3.6642,0.2929,0,2.9571],
// 4 7 0.6173 0 3.1739 1 0 3.25 1 0 4.25 0.2346 0 4.0978
  [4,7,0.6173,0,3.1739,1,0,3.25,1,0,4.25,0.2346,0,4.0978],
// 0
// 0 Pattern created wholly or in part by Quad2Dat
// 0 Thanks James
// 0
];
makepoly(ldraw_lib__3070bph0(), line=0.2);
